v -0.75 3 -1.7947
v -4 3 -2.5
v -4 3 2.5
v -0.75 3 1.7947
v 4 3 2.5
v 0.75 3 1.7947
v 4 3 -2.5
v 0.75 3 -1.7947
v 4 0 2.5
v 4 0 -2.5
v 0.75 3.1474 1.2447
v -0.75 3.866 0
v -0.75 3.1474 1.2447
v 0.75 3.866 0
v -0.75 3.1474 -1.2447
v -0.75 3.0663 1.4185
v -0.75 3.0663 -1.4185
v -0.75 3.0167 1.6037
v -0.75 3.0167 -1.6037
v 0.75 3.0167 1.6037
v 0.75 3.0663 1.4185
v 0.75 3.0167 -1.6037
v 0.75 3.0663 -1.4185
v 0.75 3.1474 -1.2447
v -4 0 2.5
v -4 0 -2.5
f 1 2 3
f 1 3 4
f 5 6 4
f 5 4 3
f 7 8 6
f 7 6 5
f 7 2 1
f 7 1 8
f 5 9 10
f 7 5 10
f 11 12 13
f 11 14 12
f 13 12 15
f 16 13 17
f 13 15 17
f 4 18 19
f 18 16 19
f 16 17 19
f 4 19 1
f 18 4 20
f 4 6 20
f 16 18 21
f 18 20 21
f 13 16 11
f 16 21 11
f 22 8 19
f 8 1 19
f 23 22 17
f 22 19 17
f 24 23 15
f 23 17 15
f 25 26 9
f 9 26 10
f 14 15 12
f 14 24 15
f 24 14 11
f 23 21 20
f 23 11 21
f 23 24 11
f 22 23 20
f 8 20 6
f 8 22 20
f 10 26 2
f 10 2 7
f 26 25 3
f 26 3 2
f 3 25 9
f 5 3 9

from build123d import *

# Parameters (mm, degrees)
SKETCH_1_W      = 8
SKETCH_1_H      = 5
EXTRUDE_1_DEPTH = 3
EXTRUDE_2_DEPTH = 0.75
FILLET_1_R      = 1.1


with BuildPart() as part:
    # 草图1 → 凸台-拉伸1 (new body)
    with BuildSketch(Plane(origin=(0, 0, 0), x_dir=(1, 0, 0), z_dir=(0, 1, 0))):
        Rectangle(SKETCH_1_W, SKETCH_1_H)
    extrude(amount=EXTRUDE_1_DEPTH)

    # 草图2 → 凸台-拉伸2 (add, symmetric)
    with BuildSketch(Plane(origin=(0, 0, 0), x_dir=(0, 0, -1), z_dir=(1, 0, 0))):
        Polygon((0, 3.866025404), (-1.5, 3), (1.5, 3), align=None)
    extrude(amount=EXTRUDE_2_DEPTH, both=True)

    # 圆角1
    fillet_1_edges = [part.edges().sort_by_distance(p)[0] for p in [
        (0, 3, -1.5),
        (0, 3, 1.5),
    ]]
    fillet(fillet_1_edges, radius=FILLET_1_R)


solid = part.part
